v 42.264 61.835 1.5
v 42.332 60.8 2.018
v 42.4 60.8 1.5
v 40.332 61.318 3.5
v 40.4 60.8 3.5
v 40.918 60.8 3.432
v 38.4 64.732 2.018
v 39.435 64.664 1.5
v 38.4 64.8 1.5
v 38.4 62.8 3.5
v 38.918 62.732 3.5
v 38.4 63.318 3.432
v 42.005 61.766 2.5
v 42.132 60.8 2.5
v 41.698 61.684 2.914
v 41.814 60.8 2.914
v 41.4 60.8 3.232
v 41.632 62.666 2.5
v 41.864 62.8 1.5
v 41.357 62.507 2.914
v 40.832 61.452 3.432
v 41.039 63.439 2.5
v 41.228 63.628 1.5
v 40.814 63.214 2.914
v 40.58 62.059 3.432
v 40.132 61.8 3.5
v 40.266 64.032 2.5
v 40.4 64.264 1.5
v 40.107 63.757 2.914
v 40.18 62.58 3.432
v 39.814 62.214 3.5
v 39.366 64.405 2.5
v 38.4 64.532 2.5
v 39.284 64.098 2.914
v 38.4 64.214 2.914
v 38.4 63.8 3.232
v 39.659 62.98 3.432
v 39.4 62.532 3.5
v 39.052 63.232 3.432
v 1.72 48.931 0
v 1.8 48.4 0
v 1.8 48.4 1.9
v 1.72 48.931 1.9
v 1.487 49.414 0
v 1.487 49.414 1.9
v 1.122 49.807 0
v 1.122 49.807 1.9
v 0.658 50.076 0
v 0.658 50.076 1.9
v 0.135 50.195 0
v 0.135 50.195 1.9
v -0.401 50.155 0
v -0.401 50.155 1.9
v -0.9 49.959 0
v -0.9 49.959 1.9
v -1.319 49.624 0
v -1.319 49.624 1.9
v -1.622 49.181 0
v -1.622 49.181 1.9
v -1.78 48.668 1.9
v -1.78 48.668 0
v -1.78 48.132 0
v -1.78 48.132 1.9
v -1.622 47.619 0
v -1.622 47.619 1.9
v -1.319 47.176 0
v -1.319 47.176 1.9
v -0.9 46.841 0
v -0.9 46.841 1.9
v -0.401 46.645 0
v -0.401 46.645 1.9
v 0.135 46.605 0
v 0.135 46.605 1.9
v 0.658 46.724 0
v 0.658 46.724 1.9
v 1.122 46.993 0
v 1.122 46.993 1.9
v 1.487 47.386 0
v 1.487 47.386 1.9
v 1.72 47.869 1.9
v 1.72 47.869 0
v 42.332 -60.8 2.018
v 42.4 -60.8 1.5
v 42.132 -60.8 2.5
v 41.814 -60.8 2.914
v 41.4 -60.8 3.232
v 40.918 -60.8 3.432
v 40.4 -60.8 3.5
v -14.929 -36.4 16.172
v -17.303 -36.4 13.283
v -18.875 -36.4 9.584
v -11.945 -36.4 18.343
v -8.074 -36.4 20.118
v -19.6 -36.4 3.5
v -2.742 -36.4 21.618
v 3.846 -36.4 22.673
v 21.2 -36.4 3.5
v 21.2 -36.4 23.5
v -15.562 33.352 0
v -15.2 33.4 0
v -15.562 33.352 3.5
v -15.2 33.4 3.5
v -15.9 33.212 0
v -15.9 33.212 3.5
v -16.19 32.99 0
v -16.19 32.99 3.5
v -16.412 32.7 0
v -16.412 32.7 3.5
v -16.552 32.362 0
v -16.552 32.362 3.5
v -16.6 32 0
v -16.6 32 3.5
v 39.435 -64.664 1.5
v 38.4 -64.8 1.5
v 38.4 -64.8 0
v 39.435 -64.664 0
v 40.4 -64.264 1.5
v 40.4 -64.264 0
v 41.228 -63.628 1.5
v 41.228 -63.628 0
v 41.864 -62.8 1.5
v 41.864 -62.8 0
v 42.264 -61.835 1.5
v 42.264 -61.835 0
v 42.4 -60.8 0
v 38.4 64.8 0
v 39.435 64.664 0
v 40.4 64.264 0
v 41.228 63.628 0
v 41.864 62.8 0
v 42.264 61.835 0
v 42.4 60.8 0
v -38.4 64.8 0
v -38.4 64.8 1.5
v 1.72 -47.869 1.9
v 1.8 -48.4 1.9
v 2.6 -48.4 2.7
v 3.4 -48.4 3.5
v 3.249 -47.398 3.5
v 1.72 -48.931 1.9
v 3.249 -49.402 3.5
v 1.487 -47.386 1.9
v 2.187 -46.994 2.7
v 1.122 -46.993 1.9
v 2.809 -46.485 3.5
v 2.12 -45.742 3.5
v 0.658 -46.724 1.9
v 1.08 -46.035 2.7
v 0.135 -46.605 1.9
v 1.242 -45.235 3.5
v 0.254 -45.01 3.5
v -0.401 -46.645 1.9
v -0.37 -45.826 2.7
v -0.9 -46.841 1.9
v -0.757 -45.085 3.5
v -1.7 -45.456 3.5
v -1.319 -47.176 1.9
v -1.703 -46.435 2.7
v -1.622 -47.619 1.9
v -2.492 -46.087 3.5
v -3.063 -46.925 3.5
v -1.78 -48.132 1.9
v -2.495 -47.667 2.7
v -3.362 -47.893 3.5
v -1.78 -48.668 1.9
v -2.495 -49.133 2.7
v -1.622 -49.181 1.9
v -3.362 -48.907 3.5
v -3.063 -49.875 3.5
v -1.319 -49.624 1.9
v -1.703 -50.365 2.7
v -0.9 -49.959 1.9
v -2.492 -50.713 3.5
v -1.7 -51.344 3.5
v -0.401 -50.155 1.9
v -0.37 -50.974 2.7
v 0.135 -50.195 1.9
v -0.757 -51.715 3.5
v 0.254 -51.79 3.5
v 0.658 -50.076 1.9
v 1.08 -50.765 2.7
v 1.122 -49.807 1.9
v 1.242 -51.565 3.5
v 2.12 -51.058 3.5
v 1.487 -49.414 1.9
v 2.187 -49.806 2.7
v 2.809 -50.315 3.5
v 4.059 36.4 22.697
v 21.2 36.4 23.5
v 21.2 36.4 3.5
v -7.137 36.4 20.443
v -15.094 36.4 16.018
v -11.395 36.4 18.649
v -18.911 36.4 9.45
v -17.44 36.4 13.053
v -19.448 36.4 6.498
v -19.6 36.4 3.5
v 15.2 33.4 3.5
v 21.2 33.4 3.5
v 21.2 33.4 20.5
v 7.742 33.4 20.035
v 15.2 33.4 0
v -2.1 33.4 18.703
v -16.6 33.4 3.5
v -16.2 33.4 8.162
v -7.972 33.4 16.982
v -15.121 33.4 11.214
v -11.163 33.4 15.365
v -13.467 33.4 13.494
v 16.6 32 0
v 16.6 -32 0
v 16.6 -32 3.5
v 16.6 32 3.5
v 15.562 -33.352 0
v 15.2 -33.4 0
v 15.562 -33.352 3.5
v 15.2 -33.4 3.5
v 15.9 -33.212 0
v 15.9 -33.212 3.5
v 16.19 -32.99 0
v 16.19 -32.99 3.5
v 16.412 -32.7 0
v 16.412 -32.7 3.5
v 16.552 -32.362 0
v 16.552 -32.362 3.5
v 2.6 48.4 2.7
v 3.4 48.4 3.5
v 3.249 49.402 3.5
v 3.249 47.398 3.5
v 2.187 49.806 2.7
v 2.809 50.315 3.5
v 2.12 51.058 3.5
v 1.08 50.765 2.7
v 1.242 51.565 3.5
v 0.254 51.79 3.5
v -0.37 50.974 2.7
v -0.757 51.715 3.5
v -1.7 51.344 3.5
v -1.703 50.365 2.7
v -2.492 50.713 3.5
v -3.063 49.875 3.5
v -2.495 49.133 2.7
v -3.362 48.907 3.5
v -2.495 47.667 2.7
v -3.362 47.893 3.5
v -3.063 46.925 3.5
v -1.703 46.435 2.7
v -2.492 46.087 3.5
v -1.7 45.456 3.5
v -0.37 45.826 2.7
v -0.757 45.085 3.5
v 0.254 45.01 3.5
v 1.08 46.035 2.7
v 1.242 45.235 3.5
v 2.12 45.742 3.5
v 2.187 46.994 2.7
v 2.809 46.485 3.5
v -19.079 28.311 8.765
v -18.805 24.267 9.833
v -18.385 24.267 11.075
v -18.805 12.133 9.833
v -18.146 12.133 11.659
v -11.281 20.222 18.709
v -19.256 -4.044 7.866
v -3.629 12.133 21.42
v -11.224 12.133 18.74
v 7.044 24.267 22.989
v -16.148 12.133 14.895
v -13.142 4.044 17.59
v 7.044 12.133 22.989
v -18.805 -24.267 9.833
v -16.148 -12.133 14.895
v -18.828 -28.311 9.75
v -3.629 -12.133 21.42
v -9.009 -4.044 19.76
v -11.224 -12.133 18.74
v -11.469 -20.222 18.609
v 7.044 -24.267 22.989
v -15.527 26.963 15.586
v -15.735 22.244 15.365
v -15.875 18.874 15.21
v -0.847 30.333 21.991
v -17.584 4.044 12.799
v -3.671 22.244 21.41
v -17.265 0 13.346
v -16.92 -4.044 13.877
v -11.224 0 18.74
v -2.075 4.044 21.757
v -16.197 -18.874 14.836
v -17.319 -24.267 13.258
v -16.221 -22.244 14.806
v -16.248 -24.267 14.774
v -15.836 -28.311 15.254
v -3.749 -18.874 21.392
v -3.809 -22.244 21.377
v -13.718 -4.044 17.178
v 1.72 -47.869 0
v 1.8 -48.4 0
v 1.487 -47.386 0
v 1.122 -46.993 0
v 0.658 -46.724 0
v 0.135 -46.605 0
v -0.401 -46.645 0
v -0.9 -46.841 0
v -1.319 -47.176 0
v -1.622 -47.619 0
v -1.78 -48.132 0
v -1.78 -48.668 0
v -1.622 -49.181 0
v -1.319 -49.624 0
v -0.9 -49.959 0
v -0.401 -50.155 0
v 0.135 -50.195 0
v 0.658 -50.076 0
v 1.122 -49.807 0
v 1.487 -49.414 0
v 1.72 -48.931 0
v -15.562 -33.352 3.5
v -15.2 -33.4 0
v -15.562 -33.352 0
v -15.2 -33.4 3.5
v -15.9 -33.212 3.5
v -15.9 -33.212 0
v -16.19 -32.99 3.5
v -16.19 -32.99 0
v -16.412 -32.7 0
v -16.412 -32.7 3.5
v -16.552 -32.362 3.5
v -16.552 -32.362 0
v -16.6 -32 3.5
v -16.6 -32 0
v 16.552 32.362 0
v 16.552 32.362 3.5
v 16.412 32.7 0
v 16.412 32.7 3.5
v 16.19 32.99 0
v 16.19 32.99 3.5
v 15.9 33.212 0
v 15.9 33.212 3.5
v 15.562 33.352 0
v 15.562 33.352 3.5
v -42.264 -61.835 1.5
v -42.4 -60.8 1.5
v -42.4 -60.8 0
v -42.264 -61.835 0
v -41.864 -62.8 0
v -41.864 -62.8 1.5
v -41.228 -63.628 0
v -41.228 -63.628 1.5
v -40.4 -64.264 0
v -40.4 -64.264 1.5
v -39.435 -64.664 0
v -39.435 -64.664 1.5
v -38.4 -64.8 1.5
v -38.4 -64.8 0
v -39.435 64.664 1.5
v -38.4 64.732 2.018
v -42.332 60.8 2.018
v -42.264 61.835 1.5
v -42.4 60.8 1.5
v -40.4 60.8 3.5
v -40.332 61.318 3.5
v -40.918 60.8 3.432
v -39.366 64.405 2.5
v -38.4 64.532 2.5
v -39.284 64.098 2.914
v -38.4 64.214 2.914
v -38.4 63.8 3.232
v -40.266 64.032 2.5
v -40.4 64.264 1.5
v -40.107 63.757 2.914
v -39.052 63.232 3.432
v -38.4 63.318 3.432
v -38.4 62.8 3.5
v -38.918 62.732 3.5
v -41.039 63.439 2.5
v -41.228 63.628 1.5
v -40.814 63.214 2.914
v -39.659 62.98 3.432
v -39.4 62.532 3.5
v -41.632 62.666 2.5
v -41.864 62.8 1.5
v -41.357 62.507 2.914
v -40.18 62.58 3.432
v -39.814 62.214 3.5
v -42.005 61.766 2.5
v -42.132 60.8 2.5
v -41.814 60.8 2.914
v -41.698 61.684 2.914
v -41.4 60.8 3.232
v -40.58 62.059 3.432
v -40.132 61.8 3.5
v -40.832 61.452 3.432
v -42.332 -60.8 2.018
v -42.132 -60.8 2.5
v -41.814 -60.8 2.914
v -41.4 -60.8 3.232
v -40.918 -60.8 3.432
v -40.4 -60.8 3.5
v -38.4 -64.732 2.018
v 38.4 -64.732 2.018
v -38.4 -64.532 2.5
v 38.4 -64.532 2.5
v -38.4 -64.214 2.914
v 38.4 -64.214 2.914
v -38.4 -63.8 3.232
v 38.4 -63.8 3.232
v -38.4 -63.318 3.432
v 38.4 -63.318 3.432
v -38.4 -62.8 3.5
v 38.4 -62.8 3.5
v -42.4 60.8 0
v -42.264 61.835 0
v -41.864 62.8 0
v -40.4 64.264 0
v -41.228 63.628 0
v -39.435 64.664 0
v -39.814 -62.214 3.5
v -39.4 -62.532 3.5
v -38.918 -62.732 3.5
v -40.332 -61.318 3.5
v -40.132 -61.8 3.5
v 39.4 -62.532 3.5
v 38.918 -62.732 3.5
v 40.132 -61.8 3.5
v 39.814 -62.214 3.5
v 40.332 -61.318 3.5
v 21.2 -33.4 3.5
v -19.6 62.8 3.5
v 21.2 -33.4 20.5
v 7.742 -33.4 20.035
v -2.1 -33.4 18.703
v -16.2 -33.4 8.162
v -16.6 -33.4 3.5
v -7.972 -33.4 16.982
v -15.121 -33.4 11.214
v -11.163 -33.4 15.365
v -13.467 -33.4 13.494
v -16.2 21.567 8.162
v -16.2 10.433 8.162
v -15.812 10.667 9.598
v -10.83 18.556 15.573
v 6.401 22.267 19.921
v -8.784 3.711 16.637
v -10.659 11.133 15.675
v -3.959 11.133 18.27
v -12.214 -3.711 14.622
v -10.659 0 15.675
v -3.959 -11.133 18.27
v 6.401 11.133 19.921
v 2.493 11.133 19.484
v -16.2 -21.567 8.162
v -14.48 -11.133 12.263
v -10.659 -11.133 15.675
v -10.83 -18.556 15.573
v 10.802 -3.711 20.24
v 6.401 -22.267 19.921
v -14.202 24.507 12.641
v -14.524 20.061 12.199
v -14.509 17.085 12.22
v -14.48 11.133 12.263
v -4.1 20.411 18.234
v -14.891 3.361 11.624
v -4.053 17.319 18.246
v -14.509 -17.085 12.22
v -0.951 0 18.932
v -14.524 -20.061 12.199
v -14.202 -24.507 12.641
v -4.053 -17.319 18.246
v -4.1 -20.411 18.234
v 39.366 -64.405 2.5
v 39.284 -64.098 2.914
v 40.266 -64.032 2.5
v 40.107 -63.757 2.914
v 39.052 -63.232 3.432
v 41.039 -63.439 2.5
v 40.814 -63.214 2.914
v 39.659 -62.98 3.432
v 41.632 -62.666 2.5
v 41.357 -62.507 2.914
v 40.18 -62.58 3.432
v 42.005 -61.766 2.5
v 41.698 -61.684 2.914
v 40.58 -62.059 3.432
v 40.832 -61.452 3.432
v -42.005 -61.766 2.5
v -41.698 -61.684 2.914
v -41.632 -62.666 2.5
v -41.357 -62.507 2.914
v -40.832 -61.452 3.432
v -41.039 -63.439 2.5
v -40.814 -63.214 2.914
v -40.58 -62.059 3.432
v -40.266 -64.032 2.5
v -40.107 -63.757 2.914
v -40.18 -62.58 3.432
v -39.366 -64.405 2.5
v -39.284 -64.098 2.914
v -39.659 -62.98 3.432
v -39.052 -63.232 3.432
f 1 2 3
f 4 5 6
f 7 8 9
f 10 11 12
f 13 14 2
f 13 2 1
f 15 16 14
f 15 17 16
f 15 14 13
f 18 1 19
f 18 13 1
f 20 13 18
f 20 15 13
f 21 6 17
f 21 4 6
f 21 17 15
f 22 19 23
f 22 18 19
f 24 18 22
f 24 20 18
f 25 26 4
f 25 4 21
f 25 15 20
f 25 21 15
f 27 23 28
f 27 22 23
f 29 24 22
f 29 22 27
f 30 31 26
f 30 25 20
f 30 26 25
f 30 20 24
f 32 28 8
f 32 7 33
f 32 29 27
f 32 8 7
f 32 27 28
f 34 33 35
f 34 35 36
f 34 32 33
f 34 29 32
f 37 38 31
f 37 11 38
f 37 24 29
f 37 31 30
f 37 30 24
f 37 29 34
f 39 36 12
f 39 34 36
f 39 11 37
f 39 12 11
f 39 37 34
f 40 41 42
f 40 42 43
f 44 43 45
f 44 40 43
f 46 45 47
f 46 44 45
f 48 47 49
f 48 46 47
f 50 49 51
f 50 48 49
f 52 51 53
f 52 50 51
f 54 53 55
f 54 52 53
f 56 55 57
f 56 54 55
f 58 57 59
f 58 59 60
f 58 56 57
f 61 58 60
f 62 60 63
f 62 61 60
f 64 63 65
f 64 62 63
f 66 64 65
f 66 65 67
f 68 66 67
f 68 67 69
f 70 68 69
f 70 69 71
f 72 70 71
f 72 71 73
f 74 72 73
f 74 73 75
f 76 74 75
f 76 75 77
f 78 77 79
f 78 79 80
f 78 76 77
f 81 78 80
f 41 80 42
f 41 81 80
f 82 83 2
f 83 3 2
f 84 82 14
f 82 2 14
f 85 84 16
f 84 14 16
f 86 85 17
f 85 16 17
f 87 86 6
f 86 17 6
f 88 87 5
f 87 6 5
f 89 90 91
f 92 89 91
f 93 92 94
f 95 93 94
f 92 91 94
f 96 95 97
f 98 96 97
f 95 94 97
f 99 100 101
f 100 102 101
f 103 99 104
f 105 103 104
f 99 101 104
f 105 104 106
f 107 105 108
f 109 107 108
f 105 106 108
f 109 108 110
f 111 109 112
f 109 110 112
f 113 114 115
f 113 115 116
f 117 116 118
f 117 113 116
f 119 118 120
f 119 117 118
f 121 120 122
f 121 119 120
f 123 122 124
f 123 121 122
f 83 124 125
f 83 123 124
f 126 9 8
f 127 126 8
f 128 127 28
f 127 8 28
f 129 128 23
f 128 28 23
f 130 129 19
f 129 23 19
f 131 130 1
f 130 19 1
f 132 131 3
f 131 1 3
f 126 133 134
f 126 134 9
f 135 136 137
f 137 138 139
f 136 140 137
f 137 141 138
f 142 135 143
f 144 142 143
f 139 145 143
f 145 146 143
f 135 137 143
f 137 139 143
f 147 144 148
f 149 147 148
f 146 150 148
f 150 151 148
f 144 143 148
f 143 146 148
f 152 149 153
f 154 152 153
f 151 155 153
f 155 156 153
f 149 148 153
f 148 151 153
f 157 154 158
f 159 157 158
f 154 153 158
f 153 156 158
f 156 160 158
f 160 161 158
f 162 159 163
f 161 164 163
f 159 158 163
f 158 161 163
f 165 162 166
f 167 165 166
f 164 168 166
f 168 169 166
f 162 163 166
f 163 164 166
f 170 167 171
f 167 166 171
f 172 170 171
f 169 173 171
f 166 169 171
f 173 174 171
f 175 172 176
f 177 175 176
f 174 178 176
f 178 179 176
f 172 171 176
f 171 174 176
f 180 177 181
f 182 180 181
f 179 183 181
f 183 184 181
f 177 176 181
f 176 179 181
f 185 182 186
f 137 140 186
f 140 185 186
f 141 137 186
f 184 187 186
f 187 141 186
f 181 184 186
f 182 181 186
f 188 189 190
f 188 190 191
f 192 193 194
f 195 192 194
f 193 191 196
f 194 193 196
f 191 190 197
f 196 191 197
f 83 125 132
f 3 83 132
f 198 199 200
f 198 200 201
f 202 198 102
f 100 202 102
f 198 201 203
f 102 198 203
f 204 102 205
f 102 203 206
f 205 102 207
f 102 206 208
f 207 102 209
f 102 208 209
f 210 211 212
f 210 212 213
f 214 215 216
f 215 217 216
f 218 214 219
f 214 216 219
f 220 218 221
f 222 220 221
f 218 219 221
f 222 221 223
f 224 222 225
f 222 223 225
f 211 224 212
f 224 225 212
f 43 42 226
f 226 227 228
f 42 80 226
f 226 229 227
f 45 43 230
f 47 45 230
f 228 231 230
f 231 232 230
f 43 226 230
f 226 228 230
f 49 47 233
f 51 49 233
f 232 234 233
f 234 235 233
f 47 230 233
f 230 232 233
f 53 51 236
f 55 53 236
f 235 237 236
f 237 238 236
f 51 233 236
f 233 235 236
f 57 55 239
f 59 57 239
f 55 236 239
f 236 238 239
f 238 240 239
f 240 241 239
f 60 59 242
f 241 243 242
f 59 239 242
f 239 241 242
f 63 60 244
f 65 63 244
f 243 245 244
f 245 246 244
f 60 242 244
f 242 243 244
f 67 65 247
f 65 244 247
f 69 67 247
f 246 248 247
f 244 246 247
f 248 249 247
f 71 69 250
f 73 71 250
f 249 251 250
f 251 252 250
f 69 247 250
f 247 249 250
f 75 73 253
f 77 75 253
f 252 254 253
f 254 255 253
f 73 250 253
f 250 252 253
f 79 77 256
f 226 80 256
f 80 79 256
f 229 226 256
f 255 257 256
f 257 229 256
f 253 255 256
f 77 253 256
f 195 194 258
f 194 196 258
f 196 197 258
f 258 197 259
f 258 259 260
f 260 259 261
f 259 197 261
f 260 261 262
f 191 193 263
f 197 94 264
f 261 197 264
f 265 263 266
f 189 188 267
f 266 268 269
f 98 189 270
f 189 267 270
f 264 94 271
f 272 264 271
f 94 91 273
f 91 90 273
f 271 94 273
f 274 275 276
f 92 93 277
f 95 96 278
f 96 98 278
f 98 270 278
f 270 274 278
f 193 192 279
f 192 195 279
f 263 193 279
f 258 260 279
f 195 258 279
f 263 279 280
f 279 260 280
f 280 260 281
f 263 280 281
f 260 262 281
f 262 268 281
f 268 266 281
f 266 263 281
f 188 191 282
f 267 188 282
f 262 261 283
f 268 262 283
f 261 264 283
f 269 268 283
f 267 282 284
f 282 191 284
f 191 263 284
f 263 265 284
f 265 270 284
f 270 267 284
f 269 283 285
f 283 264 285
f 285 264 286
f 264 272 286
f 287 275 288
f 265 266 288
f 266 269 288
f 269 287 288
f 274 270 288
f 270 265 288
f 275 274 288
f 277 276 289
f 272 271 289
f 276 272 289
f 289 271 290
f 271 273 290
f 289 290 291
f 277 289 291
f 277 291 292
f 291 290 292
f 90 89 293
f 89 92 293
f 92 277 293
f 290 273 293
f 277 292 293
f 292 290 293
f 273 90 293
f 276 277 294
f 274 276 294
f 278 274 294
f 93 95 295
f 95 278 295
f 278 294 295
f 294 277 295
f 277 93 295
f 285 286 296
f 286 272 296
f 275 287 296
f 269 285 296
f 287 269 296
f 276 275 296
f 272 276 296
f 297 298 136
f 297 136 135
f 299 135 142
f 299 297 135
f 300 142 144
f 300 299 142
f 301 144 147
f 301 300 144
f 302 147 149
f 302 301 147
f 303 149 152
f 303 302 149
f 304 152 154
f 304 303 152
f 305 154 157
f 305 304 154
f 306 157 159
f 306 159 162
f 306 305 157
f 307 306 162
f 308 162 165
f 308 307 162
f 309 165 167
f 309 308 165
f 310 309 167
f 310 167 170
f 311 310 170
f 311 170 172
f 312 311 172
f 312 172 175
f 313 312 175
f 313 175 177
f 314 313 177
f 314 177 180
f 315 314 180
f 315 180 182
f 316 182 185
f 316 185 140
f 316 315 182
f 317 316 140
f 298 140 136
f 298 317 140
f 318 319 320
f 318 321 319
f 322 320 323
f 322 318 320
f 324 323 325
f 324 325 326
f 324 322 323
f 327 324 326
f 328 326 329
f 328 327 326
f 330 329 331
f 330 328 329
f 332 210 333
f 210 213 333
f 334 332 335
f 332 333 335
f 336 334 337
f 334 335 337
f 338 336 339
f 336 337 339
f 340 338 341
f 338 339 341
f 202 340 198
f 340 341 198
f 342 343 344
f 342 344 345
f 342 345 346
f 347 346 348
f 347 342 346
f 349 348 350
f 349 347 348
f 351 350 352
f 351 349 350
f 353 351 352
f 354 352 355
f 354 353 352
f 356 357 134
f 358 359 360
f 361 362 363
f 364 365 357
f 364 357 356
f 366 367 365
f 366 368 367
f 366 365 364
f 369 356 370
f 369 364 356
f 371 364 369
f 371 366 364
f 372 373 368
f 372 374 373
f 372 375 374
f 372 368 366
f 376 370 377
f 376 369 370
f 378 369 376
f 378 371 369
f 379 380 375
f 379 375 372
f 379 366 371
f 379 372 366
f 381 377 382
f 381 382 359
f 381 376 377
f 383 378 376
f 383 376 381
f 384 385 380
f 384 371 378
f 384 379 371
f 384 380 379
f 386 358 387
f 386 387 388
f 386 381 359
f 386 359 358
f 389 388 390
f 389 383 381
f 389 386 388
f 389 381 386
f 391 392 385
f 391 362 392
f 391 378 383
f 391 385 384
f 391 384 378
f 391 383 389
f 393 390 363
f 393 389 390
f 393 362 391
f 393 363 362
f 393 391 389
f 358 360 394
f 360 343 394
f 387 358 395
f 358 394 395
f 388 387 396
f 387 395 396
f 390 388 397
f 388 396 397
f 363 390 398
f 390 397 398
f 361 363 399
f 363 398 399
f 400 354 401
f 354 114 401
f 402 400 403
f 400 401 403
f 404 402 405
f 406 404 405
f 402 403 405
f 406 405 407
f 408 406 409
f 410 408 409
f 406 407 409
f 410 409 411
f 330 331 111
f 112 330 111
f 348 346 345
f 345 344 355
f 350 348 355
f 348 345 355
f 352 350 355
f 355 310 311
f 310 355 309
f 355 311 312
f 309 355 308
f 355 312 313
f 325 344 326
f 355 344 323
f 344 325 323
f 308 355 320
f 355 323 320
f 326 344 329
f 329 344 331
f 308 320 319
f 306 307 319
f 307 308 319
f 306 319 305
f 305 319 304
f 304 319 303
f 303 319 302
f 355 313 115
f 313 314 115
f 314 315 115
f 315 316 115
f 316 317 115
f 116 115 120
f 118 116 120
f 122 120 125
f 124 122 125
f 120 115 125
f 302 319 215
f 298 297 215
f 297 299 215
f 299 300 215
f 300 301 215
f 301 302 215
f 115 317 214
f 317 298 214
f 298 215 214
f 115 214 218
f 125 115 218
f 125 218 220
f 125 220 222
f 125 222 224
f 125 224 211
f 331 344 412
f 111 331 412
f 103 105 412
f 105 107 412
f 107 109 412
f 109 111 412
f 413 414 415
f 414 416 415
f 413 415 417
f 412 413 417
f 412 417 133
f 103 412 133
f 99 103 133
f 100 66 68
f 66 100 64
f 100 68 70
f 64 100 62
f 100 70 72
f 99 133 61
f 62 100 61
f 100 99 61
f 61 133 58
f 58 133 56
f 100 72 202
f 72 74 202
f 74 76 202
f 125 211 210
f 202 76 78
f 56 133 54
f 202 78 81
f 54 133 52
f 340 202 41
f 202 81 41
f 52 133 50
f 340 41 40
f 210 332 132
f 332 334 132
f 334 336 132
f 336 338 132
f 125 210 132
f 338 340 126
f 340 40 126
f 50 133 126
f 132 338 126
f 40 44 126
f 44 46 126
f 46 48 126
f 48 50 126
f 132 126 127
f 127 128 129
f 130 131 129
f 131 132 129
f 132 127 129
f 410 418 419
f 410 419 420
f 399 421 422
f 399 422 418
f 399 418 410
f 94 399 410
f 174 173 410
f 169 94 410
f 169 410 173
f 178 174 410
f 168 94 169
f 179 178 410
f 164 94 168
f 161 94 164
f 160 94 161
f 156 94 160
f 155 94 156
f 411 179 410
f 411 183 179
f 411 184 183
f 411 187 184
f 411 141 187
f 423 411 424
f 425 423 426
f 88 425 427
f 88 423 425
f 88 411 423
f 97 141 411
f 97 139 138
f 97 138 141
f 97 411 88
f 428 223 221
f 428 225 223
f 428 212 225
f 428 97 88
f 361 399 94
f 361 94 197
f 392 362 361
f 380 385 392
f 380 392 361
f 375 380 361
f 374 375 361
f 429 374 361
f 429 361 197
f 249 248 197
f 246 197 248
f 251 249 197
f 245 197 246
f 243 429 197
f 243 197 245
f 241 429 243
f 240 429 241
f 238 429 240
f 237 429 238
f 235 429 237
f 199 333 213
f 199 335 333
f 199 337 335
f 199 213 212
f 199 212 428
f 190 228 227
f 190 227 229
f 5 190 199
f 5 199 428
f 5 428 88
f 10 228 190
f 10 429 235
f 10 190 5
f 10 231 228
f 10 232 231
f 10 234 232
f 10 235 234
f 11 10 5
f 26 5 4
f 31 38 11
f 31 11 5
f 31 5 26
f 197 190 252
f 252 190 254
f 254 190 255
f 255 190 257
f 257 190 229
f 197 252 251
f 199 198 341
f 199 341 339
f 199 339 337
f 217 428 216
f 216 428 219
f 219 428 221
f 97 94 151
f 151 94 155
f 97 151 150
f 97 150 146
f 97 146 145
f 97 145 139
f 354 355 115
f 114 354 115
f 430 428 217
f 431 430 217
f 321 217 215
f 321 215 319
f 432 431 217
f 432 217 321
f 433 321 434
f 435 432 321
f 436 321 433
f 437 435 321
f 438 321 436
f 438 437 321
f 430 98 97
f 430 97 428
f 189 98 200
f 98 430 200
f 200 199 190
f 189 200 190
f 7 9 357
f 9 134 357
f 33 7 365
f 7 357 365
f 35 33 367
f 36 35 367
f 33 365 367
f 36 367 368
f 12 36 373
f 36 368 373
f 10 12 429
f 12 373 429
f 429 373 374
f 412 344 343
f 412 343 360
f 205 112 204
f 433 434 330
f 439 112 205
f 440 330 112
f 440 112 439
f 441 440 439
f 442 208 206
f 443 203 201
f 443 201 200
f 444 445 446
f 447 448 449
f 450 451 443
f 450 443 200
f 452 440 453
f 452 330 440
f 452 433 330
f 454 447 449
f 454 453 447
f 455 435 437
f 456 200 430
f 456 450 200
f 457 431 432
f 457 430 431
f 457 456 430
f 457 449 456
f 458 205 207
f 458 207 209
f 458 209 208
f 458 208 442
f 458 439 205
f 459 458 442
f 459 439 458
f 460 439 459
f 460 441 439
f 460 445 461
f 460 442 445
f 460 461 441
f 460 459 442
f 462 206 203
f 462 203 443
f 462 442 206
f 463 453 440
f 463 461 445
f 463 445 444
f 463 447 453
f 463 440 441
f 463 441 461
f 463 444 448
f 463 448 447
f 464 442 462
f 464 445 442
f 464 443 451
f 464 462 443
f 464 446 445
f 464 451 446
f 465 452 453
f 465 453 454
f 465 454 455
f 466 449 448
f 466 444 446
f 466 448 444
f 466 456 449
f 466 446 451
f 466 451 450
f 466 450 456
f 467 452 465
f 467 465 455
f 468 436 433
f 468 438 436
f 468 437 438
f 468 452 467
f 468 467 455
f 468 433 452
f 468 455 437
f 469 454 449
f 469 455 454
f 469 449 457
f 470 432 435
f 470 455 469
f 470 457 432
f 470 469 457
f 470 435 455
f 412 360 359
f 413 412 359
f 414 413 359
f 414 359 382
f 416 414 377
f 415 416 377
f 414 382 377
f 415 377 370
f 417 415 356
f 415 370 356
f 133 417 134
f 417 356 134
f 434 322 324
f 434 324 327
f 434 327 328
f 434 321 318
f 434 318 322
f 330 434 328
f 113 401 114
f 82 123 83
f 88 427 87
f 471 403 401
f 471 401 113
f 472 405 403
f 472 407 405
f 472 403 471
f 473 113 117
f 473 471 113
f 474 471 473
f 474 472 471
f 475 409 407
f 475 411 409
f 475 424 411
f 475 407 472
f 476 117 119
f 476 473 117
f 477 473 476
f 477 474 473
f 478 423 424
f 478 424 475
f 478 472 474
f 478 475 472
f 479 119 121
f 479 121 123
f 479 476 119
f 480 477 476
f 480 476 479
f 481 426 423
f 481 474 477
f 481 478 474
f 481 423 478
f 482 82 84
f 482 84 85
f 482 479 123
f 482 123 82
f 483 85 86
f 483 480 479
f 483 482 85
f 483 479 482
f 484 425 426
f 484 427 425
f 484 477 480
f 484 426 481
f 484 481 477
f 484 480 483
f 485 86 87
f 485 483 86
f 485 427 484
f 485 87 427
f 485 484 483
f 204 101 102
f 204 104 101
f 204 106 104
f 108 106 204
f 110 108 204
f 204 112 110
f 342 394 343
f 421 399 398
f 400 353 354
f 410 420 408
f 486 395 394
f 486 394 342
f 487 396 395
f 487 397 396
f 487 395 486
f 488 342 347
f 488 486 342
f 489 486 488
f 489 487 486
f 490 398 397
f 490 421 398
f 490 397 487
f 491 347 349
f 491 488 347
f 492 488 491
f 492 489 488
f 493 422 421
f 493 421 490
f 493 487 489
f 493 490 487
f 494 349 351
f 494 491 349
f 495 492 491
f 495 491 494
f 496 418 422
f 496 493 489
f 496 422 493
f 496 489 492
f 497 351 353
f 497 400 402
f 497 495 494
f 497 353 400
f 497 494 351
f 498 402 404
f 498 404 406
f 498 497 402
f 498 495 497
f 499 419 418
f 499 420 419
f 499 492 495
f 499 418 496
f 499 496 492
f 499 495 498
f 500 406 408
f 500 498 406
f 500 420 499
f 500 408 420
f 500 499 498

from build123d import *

# Parameters (mm, degrees)
SKETCH_W        = 84.8
SKETCH_H        = 129.6
SKETCH_R        = 1.8
SKETCH_W_2      = 33.2
SKETCH_H_2      = 66.8
PAD_DEPTH       = 3.5
CHAMFER_SIZE    = 1.6
FILLET_R        = 4
FILLET001_R     = 2
FILLET002_R     = 1.4
PAD001_DEPTH    = 20
POCKET_START    = -3
POCKET_DEPTH    = 66.8
POCKET001_DEPTH = 101.201


with BuildPart() as part:
    # Sketch → Pad (new body)
    with BuildSketch(Plane.XY):
        Rectangle(SKETCH_W, SKETCH_H)
        with Locations((0, 48.4)):
            Circle(SKETCH_R, mode=Mode.SUBTRACT)
        with Locations((0, -48.4)):
            Circle(SKETCH_R, mode=Mode.SUBTRACT)
        Rectangle(SKETCH_W_2, SKETCH_H_2, mode=Mode.SUBTRACT)
    extrude(amount=PAD_DEPTH)

    # Chamfer
    chamfer_edges = [part.edges().sort_by_distance(p)[0] for p in [
        (-1.8, -48.4, 3.5),
        (-1.8, 48.4, 3.5),
    ]]
    chamfer(chamfer_edges, length=CHAMFER_SIZE)

    # Fillet
    fillet_edges = [part.edges().sort_by_distance(p)[0] for p in [
        (42.4, 64.8, 1.75),
        (-42.4, 64.8, 1.75),
        (42.4, -64.8, 1.75),
        (-42.4, -64.8, 1.75),
    ]]
    fillet(fillet_edges, radius=FILLET_R)

    # Fillet001
    fillet001_edges = [part.edges().sort_by_distance(p)[0] for p in [
        (-41.228427, -63.628427, 3.5),
        (0, -64.8, 3.5),
        (41.228427, -63.628427, 3.5),
        (42.4, 0, 3.5),
        (41.228427, 63.628427, 3.5),
        (0, 64.8, 3.5),
        (-41.228427, 63.628427, 3.5),
        (-42.4, 0, 3.5),
    ]]
    fillet(fillet001_edges, radius=FILLET001_R)

    # Fillet002
    fillet002_edges = [part.edges().sort_by_distance(p)[0] for p in [
        (-16.6, -33.4, 1.75),
        (16.6, 33.4, 1.75),
        (16.6, -33.4, 1.75),
        (-16.6, 33.4, 1.75),
    ]]
    fillet(fillet002_edges, radius=FILLET002_R)

    # Sketch001 (on Face20 of Fillet002) → Pad001 (join)
    with BuildSketch(Plane.XY.offset(3.5)):
        Polygon((21.2, 36.4), (-19.6, 36.4), (-19.6, -36.4), (21.2, -36.4), (21.2, -33.4), (21.2, 33.4), align=None)
    extrude(amount=PAD001_DEPTH)

    # Sketch002 (on Face35 of Pad001) → Pocket (cut)
    with BuildSketch(Plane.XZ.offset(36.4).offset(POCKET_START)):
        with BuildLine():
            Line((21.2, 20.5), (21.2, 3.5))
            Line((21.2, 3.5), (-16.6, 3.5))
            add(Edge.make_bspline(
                [(-16.6, 3.5), (-16.6, 13.299617), (-13.358306, 20.5), (21.2, 20.5)],
                knots=[0, 0, 0, 0, 1, 1, 1, 1], degree=3))
        make_face()
    extrude(amount=-POCKET_DEPTH, mode=Mode.SUBTRACT)

    # Sketch003 (on Face43 of Pocket) → Pocket001 (cut, through all)
    with BuildSketch(Plane.XZ.offset(36.4)):
        with BuildLine():
            add(Edge.make_bspline(
                [(-19.6, 3.5), (-19.6, 17.472133), (-10.864879, 23.5), (21.2, 23.5)],
                knots=[0, 0, 0, 0, 1, 1, 1, 1], degree=3))
            Line((21.2, 23.5), (-19.6, 23.5))
            Line((-19.6, 23.5), (-19.6, 3.5))
        make_face()
    extrude(amount=-POCKET001_DEPTH, mode=Mode.SUBTRACT)


solid = part.part
